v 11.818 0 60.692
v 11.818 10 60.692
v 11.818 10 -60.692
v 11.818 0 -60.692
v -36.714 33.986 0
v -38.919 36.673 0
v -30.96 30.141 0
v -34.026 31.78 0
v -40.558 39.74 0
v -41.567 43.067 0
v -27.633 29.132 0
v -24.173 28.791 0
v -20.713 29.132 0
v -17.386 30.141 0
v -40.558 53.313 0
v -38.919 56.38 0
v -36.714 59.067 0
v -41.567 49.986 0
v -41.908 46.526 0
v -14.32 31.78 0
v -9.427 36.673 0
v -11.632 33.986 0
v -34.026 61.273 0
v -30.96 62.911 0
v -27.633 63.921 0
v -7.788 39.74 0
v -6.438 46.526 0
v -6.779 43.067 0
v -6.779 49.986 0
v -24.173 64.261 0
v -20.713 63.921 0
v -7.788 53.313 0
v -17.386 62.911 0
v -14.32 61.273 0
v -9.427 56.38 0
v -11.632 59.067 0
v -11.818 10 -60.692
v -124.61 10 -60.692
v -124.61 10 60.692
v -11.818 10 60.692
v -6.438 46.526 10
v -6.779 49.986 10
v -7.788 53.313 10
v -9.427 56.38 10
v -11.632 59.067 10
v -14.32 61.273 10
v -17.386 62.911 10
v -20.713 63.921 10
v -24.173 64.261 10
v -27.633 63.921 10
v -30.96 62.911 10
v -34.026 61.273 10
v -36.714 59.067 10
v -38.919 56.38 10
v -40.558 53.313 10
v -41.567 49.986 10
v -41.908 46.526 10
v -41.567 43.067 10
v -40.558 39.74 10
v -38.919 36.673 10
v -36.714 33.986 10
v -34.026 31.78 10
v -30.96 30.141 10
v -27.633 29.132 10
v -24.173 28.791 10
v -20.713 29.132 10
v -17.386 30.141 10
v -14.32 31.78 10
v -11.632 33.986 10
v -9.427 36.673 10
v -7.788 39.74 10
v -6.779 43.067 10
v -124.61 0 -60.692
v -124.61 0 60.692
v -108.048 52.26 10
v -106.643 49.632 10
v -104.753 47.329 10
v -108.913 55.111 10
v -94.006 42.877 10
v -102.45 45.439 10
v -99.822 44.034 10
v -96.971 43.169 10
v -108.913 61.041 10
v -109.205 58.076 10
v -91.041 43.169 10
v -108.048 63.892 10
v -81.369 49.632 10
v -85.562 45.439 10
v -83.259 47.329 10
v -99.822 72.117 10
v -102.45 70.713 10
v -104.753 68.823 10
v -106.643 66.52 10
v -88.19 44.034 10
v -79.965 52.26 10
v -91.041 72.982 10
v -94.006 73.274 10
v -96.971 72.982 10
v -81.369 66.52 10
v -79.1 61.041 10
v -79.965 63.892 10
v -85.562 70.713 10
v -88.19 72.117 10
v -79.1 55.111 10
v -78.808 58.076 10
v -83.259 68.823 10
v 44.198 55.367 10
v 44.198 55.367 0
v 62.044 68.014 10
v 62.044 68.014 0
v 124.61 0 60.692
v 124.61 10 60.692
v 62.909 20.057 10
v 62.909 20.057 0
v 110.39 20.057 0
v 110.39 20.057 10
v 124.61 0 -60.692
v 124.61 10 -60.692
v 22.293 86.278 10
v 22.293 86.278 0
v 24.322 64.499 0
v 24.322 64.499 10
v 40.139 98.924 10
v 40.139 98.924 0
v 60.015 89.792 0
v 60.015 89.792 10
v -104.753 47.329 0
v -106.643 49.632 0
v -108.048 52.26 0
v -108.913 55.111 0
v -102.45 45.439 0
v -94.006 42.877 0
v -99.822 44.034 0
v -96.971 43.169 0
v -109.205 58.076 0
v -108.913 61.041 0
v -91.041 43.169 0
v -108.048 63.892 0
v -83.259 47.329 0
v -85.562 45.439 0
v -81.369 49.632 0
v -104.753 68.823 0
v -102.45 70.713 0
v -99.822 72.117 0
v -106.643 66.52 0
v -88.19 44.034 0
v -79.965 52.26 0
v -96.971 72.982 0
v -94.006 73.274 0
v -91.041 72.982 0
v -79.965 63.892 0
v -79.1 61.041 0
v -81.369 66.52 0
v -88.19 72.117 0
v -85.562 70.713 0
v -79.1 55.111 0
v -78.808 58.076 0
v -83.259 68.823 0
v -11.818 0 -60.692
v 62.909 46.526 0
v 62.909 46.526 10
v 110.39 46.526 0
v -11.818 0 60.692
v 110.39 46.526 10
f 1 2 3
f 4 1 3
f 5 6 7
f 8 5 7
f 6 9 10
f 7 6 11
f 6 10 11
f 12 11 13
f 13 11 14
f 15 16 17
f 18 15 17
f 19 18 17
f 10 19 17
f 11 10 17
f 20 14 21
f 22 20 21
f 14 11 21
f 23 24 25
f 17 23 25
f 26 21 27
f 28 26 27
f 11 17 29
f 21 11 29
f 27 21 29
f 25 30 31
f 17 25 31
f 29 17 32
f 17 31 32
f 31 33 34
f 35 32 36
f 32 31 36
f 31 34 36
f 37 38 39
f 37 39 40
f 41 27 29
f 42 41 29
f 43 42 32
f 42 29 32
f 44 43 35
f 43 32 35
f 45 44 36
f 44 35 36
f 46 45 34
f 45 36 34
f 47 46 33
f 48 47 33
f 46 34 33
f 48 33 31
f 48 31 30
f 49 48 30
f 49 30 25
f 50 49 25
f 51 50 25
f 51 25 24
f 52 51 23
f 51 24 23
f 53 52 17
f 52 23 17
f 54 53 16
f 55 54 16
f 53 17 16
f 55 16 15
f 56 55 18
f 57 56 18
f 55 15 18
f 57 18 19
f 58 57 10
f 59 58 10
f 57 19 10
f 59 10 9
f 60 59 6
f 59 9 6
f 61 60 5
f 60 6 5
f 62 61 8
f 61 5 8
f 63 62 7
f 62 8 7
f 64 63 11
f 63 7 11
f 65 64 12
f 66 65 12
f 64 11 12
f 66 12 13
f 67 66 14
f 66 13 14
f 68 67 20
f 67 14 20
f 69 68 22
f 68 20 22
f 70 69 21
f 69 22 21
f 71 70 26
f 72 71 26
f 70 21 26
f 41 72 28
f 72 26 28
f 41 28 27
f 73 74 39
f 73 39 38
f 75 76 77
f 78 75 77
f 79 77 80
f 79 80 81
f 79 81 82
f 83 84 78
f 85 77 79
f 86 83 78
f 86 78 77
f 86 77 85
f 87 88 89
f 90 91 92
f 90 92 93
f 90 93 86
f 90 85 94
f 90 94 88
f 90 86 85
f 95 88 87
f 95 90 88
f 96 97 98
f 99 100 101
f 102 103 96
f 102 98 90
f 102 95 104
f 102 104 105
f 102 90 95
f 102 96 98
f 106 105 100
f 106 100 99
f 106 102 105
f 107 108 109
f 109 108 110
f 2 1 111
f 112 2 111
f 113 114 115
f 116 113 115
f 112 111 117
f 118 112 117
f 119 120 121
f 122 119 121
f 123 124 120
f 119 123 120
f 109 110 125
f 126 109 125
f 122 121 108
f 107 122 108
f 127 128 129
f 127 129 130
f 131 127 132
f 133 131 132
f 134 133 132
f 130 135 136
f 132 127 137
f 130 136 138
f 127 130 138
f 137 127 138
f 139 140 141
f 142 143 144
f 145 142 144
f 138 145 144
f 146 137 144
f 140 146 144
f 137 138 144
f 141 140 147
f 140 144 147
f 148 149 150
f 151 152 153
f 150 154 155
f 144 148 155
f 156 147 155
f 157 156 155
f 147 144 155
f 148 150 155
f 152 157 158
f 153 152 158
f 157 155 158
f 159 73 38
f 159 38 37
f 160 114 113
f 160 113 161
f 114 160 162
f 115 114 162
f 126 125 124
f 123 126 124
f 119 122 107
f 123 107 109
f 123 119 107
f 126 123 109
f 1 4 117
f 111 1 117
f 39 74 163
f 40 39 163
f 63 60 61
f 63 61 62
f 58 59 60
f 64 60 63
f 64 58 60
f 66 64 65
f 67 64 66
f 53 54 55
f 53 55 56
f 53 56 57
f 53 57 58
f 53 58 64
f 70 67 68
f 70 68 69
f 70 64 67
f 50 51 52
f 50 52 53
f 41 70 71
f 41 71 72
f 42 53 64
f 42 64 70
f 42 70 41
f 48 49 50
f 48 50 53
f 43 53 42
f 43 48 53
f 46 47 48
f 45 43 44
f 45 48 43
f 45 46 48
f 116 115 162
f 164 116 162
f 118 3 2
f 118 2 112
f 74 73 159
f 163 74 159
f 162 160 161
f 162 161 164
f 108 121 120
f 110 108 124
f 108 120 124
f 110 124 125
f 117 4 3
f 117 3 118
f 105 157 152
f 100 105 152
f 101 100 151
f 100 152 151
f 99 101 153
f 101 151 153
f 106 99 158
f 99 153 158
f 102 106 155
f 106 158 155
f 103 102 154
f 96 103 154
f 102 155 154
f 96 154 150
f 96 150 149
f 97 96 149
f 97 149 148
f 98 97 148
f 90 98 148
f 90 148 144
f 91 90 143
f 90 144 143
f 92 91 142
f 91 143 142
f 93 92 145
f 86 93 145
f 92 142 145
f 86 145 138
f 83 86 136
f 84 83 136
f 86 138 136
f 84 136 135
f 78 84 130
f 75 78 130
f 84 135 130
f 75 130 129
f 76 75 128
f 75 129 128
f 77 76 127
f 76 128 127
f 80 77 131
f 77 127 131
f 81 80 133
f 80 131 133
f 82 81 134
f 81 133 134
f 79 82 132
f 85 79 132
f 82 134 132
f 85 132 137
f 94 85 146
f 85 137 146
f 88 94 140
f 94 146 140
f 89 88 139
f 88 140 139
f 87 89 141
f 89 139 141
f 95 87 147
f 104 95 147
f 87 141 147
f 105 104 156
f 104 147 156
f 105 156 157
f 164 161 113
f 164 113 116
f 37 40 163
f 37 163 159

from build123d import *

# Parameters (mm, degrees)
SKETCH1_W             = 249.220426788
SKETCH1_H             = 121.383255676
BOSS_EXTRUDE1_DEPTH   = 10
SKETCH2_W             = 23.635852348
SKETCH2_H             = 158.79506956
CUT_EXTRUDE1_DEPTH    = 139.96466807
SKETCH3_R             = 15.19844863
BOSS_EXTRUDE2_DEPTH   = 10
SKETCH3_R_2           = 17.73502646
BOSS_EXTRUDE2_2_DEPTH = 10
BOSS_EXTRUDE2_3_DEPTH = 10
SKETCH3_W             = 47.480785839
SKETCH3_H             = 26.469909154
BOSS_EXTRUDE2_4_DEPTH = 10


with BuildPart() as part:
    # Sketch1 → Boss-Extrude1 (new body)
    with BuildSketch(Plane(origin=(0, 0, 0), x_dir=(1, 0, 0), z_dir=(0, 1, 0))):
        Rectangle(SKETCH1_W, SKETCH1_H)
    extrude(amount=BOSS_EXTRUDE1_DEPTH)

    # Sketch2 → Cut-Extrude1 (cut, through all)
    with BuildSketch(Plane(origin=(0, 10, 0), x_dir=(1, 0, 0), z_dir=(0, 1, 0))):
        Rectangle(SKETCH2_W, SKETCH2_H)
    extrude(amount=-CUT_EXTRUDE1_DEPTH, mode=Mode.SUBTRACT)


with BuildPart() as cut_extrude1_piece_1:
    # of the separate pieces the step leaves, piece 1, a body of its own (cut_extrude1_pieces)
    add(part.part.solids().sort_by_distance((-124.610213394, 0, 60.691627838))[0])


with BuildPart() as cut_extrude1_piece_2:
    # of the separate pieces the step leaves, piece 2, a body of its own (cut_extrude1_pieces)
    add(part.part.solids().sort_by_distance((11.817926174, 0, 60.691627838))[0])


with BuildPart() as body_3:
    # Sketch3 → Boss-Extrude2 (new body)
    with BuildSketch(Plane.XY):
        with Locations((-94.006230926, 58.075790121)):
            Circle(SKETCH3_R)
    extrude(amount=BOSS_EXTRUDE2_DEPTH)


with BuildPart() as body_4:
    # Sketch3 → Boss-Extrude2 2 (new body)
    with BuildSketch(Plane.XY):
        with Locations((-24.173030809, 46.526453179)):
            Circle(SKETCH3_R_2)
    extrude(amount=BOSS_EXTRUDE2_2_DEPTH)


with BuildPart() as body_5:
    # Sketch3 → Boss-Extrude2 3 (new body)
    with BuildSketch(Plane.XY):
        Polygon((62.044112411, 68.013591676), (60.014884168, 89.792385816), (40.139281058, 98.924419677), (22.292906191, 86.277659399), (24.322134434, 64.498865259), (44.197737544, 55.366831398), align=None)
    extrude(amount=BOSS_EXTRUDE2_3_DEPTH)


with BuildPart() as body_6:
    # Sketch3 → Boss-Extrude2 4 (new body)
    with BuildSketch(Plane.XY):
        with Locations((86.649781111, 33.291498602)):
            Rectangle(SKETCH3_W, SKETCH3_H)
    extrude(amount=BOSS_EXTRUDE2_4_DEPTH)


solid = Compound([cut_extrude1_piece_1.part, cut_extrude1_piece_2.part, body_3.part, body_4.part, body_5.part, body_6.part])
